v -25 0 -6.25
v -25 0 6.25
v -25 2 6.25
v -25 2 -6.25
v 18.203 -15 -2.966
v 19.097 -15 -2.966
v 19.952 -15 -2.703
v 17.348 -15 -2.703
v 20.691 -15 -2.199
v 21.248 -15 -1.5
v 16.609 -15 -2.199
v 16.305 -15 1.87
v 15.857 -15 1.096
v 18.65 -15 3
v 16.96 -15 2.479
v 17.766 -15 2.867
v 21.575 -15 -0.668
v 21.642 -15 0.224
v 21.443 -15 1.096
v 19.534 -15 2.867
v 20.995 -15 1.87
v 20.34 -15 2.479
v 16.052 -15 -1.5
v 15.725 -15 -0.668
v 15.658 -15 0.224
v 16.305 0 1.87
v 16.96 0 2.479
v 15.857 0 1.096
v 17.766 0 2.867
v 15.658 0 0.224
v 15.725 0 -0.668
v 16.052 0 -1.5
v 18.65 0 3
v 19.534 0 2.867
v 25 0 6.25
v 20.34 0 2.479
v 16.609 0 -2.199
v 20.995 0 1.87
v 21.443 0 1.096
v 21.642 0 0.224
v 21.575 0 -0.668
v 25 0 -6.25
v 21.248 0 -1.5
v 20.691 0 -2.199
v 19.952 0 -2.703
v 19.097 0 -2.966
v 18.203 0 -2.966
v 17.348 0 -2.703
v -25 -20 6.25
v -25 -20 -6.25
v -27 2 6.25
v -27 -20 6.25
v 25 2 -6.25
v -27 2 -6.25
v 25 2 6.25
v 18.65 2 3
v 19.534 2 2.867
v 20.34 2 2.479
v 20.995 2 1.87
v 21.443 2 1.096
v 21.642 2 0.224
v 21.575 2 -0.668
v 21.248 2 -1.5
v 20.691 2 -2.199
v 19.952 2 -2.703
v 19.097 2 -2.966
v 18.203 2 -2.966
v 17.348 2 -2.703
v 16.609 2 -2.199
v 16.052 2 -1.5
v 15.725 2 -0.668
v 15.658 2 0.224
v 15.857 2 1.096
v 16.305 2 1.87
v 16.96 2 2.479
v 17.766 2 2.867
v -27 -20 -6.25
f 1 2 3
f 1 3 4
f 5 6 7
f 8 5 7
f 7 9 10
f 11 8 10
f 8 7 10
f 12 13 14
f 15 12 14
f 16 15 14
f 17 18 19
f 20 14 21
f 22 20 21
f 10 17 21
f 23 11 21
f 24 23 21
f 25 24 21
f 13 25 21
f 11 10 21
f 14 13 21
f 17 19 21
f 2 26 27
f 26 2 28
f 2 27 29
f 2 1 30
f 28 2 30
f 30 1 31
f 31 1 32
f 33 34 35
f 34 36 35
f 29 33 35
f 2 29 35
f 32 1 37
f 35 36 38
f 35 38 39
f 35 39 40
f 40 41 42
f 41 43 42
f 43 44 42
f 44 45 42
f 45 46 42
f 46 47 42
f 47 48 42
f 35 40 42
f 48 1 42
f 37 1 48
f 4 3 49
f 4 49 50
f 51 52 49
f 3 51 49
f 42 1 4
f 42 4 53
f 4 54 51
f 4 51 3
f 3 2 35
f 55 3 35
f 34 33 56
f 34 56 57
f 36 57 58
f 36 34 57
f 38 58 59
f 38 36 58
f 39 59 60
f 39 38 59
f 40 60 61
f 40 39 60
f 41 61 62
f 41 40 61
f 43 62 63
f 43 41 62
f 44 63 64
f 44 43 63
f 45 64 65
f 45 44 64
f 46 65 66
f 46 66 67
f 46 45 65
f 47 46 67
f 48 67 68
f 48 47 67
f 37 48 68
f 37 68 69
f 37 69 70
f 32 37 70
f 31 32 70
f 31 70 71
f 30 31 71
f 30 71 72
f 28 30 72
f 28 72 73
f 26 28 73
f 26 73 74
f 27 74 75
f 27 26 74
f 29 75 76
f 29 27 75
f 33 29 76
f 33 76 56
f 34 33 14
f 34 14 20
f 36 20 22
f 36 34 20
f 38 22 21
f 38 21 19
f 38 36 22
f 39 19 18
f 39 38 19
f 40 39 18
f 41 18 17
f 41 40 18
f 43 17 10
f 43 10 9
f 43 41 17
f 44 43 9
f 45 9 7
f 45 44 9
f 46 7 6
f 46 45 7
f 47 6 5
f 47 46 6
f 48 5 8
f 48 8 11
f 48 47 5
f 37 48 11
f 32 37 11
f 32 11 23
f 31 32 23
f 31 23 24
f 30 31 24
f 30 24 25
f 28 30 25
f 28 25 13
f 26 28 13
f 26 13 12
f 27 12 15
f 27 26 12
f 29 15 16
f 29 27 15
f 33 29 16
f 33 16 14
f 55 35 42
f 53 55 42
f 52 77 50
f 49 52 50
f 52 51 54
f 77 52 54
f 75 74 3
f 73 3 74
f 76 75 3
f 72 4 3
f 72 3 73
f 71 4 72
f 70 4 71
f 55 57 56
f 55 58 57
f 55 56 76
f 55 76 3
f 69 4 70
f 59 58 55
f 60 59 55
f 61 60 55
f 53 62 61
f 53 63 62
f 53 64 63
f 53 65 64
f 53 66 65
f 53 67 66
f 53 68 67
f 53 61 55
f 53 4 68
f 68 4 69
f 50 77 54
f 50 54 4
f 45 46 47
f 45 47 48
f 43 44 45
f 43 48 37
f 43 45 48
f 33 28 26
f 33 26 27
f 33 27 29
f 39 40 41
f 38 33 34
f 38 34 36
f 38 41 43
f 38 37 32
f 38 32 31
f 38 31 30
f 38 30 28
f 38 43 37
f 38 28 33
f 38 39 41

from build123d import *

# Parameters (mm, degrees)
BOSS_EXTRUDE6_DEPTH      = 2
BOSS_EXTRUDE6_DEPTH_BACK = 20
SKETCH1_W                = 2
SKETCH1_H                = 12.5
SKETCH1_4_W              = 50
SKETCH1_4_H              = 12.5
SKETCH1_4_R              = 3
BOSS_EXTRUDE7_DEPTH      = 2
SKETCH1_5_R              = 3
BOSS_EXTRUDE8_DEPTH      = 15


with BuildPart() as part:
    # Sketch1 → Boss-Extrude6 (new, two sides: drawn at the far end of the back side and taken through both)
    with BuildSketch(Plane(origin=(0, 0, 0), x_dir=(1, 0, 0), z_dir=(0, 1, 0)).offset(-BOSS_EXTRUDE6_DEPTH_BACK)):
        with Locations((-26, 0)):
            Rectangle(SKETCH1_W, SKETCH1_H)
    extrude(amount=BOSS_EXTRUDE6_DEPTH + BOSS_EXTRUDE6_DEPTH_BACK)


with BuildPart() as body_2:
    # Sketch1<4> → Boss-Extrude7 (new body)
    with BuildSketch(Plane(origin=(0, 0, 0), x_dir=(1, 0, 0), z_dir=(0, 1, 0))):
        Rectangle(SKETCH1_4_W, SKETCH1_4_H)
        with Locations((18.65, 0)):
            Circle(SKETCH1_4_R, mode=Mode.SUBTRACT)
    extrude(amount=BOSS_EXTRUDE7_DEPTH)


with BuildPart() as body_3:
    # Sketch1<5> → Boss-Extrude8 (new body)
    with BuildSketch(Plane(origin=(0, 0, 0), x_dir=(1, 0, 0), z_dir=(0, 1, 0))):
        with Locations((18.65, 0)):
            Circle(SKETCH1_5_R)
    extrude(amount=-BOSS_EXTRUDE8_DEPTH)


solid = Compound([part.part, body_2.part, body_3.part])
